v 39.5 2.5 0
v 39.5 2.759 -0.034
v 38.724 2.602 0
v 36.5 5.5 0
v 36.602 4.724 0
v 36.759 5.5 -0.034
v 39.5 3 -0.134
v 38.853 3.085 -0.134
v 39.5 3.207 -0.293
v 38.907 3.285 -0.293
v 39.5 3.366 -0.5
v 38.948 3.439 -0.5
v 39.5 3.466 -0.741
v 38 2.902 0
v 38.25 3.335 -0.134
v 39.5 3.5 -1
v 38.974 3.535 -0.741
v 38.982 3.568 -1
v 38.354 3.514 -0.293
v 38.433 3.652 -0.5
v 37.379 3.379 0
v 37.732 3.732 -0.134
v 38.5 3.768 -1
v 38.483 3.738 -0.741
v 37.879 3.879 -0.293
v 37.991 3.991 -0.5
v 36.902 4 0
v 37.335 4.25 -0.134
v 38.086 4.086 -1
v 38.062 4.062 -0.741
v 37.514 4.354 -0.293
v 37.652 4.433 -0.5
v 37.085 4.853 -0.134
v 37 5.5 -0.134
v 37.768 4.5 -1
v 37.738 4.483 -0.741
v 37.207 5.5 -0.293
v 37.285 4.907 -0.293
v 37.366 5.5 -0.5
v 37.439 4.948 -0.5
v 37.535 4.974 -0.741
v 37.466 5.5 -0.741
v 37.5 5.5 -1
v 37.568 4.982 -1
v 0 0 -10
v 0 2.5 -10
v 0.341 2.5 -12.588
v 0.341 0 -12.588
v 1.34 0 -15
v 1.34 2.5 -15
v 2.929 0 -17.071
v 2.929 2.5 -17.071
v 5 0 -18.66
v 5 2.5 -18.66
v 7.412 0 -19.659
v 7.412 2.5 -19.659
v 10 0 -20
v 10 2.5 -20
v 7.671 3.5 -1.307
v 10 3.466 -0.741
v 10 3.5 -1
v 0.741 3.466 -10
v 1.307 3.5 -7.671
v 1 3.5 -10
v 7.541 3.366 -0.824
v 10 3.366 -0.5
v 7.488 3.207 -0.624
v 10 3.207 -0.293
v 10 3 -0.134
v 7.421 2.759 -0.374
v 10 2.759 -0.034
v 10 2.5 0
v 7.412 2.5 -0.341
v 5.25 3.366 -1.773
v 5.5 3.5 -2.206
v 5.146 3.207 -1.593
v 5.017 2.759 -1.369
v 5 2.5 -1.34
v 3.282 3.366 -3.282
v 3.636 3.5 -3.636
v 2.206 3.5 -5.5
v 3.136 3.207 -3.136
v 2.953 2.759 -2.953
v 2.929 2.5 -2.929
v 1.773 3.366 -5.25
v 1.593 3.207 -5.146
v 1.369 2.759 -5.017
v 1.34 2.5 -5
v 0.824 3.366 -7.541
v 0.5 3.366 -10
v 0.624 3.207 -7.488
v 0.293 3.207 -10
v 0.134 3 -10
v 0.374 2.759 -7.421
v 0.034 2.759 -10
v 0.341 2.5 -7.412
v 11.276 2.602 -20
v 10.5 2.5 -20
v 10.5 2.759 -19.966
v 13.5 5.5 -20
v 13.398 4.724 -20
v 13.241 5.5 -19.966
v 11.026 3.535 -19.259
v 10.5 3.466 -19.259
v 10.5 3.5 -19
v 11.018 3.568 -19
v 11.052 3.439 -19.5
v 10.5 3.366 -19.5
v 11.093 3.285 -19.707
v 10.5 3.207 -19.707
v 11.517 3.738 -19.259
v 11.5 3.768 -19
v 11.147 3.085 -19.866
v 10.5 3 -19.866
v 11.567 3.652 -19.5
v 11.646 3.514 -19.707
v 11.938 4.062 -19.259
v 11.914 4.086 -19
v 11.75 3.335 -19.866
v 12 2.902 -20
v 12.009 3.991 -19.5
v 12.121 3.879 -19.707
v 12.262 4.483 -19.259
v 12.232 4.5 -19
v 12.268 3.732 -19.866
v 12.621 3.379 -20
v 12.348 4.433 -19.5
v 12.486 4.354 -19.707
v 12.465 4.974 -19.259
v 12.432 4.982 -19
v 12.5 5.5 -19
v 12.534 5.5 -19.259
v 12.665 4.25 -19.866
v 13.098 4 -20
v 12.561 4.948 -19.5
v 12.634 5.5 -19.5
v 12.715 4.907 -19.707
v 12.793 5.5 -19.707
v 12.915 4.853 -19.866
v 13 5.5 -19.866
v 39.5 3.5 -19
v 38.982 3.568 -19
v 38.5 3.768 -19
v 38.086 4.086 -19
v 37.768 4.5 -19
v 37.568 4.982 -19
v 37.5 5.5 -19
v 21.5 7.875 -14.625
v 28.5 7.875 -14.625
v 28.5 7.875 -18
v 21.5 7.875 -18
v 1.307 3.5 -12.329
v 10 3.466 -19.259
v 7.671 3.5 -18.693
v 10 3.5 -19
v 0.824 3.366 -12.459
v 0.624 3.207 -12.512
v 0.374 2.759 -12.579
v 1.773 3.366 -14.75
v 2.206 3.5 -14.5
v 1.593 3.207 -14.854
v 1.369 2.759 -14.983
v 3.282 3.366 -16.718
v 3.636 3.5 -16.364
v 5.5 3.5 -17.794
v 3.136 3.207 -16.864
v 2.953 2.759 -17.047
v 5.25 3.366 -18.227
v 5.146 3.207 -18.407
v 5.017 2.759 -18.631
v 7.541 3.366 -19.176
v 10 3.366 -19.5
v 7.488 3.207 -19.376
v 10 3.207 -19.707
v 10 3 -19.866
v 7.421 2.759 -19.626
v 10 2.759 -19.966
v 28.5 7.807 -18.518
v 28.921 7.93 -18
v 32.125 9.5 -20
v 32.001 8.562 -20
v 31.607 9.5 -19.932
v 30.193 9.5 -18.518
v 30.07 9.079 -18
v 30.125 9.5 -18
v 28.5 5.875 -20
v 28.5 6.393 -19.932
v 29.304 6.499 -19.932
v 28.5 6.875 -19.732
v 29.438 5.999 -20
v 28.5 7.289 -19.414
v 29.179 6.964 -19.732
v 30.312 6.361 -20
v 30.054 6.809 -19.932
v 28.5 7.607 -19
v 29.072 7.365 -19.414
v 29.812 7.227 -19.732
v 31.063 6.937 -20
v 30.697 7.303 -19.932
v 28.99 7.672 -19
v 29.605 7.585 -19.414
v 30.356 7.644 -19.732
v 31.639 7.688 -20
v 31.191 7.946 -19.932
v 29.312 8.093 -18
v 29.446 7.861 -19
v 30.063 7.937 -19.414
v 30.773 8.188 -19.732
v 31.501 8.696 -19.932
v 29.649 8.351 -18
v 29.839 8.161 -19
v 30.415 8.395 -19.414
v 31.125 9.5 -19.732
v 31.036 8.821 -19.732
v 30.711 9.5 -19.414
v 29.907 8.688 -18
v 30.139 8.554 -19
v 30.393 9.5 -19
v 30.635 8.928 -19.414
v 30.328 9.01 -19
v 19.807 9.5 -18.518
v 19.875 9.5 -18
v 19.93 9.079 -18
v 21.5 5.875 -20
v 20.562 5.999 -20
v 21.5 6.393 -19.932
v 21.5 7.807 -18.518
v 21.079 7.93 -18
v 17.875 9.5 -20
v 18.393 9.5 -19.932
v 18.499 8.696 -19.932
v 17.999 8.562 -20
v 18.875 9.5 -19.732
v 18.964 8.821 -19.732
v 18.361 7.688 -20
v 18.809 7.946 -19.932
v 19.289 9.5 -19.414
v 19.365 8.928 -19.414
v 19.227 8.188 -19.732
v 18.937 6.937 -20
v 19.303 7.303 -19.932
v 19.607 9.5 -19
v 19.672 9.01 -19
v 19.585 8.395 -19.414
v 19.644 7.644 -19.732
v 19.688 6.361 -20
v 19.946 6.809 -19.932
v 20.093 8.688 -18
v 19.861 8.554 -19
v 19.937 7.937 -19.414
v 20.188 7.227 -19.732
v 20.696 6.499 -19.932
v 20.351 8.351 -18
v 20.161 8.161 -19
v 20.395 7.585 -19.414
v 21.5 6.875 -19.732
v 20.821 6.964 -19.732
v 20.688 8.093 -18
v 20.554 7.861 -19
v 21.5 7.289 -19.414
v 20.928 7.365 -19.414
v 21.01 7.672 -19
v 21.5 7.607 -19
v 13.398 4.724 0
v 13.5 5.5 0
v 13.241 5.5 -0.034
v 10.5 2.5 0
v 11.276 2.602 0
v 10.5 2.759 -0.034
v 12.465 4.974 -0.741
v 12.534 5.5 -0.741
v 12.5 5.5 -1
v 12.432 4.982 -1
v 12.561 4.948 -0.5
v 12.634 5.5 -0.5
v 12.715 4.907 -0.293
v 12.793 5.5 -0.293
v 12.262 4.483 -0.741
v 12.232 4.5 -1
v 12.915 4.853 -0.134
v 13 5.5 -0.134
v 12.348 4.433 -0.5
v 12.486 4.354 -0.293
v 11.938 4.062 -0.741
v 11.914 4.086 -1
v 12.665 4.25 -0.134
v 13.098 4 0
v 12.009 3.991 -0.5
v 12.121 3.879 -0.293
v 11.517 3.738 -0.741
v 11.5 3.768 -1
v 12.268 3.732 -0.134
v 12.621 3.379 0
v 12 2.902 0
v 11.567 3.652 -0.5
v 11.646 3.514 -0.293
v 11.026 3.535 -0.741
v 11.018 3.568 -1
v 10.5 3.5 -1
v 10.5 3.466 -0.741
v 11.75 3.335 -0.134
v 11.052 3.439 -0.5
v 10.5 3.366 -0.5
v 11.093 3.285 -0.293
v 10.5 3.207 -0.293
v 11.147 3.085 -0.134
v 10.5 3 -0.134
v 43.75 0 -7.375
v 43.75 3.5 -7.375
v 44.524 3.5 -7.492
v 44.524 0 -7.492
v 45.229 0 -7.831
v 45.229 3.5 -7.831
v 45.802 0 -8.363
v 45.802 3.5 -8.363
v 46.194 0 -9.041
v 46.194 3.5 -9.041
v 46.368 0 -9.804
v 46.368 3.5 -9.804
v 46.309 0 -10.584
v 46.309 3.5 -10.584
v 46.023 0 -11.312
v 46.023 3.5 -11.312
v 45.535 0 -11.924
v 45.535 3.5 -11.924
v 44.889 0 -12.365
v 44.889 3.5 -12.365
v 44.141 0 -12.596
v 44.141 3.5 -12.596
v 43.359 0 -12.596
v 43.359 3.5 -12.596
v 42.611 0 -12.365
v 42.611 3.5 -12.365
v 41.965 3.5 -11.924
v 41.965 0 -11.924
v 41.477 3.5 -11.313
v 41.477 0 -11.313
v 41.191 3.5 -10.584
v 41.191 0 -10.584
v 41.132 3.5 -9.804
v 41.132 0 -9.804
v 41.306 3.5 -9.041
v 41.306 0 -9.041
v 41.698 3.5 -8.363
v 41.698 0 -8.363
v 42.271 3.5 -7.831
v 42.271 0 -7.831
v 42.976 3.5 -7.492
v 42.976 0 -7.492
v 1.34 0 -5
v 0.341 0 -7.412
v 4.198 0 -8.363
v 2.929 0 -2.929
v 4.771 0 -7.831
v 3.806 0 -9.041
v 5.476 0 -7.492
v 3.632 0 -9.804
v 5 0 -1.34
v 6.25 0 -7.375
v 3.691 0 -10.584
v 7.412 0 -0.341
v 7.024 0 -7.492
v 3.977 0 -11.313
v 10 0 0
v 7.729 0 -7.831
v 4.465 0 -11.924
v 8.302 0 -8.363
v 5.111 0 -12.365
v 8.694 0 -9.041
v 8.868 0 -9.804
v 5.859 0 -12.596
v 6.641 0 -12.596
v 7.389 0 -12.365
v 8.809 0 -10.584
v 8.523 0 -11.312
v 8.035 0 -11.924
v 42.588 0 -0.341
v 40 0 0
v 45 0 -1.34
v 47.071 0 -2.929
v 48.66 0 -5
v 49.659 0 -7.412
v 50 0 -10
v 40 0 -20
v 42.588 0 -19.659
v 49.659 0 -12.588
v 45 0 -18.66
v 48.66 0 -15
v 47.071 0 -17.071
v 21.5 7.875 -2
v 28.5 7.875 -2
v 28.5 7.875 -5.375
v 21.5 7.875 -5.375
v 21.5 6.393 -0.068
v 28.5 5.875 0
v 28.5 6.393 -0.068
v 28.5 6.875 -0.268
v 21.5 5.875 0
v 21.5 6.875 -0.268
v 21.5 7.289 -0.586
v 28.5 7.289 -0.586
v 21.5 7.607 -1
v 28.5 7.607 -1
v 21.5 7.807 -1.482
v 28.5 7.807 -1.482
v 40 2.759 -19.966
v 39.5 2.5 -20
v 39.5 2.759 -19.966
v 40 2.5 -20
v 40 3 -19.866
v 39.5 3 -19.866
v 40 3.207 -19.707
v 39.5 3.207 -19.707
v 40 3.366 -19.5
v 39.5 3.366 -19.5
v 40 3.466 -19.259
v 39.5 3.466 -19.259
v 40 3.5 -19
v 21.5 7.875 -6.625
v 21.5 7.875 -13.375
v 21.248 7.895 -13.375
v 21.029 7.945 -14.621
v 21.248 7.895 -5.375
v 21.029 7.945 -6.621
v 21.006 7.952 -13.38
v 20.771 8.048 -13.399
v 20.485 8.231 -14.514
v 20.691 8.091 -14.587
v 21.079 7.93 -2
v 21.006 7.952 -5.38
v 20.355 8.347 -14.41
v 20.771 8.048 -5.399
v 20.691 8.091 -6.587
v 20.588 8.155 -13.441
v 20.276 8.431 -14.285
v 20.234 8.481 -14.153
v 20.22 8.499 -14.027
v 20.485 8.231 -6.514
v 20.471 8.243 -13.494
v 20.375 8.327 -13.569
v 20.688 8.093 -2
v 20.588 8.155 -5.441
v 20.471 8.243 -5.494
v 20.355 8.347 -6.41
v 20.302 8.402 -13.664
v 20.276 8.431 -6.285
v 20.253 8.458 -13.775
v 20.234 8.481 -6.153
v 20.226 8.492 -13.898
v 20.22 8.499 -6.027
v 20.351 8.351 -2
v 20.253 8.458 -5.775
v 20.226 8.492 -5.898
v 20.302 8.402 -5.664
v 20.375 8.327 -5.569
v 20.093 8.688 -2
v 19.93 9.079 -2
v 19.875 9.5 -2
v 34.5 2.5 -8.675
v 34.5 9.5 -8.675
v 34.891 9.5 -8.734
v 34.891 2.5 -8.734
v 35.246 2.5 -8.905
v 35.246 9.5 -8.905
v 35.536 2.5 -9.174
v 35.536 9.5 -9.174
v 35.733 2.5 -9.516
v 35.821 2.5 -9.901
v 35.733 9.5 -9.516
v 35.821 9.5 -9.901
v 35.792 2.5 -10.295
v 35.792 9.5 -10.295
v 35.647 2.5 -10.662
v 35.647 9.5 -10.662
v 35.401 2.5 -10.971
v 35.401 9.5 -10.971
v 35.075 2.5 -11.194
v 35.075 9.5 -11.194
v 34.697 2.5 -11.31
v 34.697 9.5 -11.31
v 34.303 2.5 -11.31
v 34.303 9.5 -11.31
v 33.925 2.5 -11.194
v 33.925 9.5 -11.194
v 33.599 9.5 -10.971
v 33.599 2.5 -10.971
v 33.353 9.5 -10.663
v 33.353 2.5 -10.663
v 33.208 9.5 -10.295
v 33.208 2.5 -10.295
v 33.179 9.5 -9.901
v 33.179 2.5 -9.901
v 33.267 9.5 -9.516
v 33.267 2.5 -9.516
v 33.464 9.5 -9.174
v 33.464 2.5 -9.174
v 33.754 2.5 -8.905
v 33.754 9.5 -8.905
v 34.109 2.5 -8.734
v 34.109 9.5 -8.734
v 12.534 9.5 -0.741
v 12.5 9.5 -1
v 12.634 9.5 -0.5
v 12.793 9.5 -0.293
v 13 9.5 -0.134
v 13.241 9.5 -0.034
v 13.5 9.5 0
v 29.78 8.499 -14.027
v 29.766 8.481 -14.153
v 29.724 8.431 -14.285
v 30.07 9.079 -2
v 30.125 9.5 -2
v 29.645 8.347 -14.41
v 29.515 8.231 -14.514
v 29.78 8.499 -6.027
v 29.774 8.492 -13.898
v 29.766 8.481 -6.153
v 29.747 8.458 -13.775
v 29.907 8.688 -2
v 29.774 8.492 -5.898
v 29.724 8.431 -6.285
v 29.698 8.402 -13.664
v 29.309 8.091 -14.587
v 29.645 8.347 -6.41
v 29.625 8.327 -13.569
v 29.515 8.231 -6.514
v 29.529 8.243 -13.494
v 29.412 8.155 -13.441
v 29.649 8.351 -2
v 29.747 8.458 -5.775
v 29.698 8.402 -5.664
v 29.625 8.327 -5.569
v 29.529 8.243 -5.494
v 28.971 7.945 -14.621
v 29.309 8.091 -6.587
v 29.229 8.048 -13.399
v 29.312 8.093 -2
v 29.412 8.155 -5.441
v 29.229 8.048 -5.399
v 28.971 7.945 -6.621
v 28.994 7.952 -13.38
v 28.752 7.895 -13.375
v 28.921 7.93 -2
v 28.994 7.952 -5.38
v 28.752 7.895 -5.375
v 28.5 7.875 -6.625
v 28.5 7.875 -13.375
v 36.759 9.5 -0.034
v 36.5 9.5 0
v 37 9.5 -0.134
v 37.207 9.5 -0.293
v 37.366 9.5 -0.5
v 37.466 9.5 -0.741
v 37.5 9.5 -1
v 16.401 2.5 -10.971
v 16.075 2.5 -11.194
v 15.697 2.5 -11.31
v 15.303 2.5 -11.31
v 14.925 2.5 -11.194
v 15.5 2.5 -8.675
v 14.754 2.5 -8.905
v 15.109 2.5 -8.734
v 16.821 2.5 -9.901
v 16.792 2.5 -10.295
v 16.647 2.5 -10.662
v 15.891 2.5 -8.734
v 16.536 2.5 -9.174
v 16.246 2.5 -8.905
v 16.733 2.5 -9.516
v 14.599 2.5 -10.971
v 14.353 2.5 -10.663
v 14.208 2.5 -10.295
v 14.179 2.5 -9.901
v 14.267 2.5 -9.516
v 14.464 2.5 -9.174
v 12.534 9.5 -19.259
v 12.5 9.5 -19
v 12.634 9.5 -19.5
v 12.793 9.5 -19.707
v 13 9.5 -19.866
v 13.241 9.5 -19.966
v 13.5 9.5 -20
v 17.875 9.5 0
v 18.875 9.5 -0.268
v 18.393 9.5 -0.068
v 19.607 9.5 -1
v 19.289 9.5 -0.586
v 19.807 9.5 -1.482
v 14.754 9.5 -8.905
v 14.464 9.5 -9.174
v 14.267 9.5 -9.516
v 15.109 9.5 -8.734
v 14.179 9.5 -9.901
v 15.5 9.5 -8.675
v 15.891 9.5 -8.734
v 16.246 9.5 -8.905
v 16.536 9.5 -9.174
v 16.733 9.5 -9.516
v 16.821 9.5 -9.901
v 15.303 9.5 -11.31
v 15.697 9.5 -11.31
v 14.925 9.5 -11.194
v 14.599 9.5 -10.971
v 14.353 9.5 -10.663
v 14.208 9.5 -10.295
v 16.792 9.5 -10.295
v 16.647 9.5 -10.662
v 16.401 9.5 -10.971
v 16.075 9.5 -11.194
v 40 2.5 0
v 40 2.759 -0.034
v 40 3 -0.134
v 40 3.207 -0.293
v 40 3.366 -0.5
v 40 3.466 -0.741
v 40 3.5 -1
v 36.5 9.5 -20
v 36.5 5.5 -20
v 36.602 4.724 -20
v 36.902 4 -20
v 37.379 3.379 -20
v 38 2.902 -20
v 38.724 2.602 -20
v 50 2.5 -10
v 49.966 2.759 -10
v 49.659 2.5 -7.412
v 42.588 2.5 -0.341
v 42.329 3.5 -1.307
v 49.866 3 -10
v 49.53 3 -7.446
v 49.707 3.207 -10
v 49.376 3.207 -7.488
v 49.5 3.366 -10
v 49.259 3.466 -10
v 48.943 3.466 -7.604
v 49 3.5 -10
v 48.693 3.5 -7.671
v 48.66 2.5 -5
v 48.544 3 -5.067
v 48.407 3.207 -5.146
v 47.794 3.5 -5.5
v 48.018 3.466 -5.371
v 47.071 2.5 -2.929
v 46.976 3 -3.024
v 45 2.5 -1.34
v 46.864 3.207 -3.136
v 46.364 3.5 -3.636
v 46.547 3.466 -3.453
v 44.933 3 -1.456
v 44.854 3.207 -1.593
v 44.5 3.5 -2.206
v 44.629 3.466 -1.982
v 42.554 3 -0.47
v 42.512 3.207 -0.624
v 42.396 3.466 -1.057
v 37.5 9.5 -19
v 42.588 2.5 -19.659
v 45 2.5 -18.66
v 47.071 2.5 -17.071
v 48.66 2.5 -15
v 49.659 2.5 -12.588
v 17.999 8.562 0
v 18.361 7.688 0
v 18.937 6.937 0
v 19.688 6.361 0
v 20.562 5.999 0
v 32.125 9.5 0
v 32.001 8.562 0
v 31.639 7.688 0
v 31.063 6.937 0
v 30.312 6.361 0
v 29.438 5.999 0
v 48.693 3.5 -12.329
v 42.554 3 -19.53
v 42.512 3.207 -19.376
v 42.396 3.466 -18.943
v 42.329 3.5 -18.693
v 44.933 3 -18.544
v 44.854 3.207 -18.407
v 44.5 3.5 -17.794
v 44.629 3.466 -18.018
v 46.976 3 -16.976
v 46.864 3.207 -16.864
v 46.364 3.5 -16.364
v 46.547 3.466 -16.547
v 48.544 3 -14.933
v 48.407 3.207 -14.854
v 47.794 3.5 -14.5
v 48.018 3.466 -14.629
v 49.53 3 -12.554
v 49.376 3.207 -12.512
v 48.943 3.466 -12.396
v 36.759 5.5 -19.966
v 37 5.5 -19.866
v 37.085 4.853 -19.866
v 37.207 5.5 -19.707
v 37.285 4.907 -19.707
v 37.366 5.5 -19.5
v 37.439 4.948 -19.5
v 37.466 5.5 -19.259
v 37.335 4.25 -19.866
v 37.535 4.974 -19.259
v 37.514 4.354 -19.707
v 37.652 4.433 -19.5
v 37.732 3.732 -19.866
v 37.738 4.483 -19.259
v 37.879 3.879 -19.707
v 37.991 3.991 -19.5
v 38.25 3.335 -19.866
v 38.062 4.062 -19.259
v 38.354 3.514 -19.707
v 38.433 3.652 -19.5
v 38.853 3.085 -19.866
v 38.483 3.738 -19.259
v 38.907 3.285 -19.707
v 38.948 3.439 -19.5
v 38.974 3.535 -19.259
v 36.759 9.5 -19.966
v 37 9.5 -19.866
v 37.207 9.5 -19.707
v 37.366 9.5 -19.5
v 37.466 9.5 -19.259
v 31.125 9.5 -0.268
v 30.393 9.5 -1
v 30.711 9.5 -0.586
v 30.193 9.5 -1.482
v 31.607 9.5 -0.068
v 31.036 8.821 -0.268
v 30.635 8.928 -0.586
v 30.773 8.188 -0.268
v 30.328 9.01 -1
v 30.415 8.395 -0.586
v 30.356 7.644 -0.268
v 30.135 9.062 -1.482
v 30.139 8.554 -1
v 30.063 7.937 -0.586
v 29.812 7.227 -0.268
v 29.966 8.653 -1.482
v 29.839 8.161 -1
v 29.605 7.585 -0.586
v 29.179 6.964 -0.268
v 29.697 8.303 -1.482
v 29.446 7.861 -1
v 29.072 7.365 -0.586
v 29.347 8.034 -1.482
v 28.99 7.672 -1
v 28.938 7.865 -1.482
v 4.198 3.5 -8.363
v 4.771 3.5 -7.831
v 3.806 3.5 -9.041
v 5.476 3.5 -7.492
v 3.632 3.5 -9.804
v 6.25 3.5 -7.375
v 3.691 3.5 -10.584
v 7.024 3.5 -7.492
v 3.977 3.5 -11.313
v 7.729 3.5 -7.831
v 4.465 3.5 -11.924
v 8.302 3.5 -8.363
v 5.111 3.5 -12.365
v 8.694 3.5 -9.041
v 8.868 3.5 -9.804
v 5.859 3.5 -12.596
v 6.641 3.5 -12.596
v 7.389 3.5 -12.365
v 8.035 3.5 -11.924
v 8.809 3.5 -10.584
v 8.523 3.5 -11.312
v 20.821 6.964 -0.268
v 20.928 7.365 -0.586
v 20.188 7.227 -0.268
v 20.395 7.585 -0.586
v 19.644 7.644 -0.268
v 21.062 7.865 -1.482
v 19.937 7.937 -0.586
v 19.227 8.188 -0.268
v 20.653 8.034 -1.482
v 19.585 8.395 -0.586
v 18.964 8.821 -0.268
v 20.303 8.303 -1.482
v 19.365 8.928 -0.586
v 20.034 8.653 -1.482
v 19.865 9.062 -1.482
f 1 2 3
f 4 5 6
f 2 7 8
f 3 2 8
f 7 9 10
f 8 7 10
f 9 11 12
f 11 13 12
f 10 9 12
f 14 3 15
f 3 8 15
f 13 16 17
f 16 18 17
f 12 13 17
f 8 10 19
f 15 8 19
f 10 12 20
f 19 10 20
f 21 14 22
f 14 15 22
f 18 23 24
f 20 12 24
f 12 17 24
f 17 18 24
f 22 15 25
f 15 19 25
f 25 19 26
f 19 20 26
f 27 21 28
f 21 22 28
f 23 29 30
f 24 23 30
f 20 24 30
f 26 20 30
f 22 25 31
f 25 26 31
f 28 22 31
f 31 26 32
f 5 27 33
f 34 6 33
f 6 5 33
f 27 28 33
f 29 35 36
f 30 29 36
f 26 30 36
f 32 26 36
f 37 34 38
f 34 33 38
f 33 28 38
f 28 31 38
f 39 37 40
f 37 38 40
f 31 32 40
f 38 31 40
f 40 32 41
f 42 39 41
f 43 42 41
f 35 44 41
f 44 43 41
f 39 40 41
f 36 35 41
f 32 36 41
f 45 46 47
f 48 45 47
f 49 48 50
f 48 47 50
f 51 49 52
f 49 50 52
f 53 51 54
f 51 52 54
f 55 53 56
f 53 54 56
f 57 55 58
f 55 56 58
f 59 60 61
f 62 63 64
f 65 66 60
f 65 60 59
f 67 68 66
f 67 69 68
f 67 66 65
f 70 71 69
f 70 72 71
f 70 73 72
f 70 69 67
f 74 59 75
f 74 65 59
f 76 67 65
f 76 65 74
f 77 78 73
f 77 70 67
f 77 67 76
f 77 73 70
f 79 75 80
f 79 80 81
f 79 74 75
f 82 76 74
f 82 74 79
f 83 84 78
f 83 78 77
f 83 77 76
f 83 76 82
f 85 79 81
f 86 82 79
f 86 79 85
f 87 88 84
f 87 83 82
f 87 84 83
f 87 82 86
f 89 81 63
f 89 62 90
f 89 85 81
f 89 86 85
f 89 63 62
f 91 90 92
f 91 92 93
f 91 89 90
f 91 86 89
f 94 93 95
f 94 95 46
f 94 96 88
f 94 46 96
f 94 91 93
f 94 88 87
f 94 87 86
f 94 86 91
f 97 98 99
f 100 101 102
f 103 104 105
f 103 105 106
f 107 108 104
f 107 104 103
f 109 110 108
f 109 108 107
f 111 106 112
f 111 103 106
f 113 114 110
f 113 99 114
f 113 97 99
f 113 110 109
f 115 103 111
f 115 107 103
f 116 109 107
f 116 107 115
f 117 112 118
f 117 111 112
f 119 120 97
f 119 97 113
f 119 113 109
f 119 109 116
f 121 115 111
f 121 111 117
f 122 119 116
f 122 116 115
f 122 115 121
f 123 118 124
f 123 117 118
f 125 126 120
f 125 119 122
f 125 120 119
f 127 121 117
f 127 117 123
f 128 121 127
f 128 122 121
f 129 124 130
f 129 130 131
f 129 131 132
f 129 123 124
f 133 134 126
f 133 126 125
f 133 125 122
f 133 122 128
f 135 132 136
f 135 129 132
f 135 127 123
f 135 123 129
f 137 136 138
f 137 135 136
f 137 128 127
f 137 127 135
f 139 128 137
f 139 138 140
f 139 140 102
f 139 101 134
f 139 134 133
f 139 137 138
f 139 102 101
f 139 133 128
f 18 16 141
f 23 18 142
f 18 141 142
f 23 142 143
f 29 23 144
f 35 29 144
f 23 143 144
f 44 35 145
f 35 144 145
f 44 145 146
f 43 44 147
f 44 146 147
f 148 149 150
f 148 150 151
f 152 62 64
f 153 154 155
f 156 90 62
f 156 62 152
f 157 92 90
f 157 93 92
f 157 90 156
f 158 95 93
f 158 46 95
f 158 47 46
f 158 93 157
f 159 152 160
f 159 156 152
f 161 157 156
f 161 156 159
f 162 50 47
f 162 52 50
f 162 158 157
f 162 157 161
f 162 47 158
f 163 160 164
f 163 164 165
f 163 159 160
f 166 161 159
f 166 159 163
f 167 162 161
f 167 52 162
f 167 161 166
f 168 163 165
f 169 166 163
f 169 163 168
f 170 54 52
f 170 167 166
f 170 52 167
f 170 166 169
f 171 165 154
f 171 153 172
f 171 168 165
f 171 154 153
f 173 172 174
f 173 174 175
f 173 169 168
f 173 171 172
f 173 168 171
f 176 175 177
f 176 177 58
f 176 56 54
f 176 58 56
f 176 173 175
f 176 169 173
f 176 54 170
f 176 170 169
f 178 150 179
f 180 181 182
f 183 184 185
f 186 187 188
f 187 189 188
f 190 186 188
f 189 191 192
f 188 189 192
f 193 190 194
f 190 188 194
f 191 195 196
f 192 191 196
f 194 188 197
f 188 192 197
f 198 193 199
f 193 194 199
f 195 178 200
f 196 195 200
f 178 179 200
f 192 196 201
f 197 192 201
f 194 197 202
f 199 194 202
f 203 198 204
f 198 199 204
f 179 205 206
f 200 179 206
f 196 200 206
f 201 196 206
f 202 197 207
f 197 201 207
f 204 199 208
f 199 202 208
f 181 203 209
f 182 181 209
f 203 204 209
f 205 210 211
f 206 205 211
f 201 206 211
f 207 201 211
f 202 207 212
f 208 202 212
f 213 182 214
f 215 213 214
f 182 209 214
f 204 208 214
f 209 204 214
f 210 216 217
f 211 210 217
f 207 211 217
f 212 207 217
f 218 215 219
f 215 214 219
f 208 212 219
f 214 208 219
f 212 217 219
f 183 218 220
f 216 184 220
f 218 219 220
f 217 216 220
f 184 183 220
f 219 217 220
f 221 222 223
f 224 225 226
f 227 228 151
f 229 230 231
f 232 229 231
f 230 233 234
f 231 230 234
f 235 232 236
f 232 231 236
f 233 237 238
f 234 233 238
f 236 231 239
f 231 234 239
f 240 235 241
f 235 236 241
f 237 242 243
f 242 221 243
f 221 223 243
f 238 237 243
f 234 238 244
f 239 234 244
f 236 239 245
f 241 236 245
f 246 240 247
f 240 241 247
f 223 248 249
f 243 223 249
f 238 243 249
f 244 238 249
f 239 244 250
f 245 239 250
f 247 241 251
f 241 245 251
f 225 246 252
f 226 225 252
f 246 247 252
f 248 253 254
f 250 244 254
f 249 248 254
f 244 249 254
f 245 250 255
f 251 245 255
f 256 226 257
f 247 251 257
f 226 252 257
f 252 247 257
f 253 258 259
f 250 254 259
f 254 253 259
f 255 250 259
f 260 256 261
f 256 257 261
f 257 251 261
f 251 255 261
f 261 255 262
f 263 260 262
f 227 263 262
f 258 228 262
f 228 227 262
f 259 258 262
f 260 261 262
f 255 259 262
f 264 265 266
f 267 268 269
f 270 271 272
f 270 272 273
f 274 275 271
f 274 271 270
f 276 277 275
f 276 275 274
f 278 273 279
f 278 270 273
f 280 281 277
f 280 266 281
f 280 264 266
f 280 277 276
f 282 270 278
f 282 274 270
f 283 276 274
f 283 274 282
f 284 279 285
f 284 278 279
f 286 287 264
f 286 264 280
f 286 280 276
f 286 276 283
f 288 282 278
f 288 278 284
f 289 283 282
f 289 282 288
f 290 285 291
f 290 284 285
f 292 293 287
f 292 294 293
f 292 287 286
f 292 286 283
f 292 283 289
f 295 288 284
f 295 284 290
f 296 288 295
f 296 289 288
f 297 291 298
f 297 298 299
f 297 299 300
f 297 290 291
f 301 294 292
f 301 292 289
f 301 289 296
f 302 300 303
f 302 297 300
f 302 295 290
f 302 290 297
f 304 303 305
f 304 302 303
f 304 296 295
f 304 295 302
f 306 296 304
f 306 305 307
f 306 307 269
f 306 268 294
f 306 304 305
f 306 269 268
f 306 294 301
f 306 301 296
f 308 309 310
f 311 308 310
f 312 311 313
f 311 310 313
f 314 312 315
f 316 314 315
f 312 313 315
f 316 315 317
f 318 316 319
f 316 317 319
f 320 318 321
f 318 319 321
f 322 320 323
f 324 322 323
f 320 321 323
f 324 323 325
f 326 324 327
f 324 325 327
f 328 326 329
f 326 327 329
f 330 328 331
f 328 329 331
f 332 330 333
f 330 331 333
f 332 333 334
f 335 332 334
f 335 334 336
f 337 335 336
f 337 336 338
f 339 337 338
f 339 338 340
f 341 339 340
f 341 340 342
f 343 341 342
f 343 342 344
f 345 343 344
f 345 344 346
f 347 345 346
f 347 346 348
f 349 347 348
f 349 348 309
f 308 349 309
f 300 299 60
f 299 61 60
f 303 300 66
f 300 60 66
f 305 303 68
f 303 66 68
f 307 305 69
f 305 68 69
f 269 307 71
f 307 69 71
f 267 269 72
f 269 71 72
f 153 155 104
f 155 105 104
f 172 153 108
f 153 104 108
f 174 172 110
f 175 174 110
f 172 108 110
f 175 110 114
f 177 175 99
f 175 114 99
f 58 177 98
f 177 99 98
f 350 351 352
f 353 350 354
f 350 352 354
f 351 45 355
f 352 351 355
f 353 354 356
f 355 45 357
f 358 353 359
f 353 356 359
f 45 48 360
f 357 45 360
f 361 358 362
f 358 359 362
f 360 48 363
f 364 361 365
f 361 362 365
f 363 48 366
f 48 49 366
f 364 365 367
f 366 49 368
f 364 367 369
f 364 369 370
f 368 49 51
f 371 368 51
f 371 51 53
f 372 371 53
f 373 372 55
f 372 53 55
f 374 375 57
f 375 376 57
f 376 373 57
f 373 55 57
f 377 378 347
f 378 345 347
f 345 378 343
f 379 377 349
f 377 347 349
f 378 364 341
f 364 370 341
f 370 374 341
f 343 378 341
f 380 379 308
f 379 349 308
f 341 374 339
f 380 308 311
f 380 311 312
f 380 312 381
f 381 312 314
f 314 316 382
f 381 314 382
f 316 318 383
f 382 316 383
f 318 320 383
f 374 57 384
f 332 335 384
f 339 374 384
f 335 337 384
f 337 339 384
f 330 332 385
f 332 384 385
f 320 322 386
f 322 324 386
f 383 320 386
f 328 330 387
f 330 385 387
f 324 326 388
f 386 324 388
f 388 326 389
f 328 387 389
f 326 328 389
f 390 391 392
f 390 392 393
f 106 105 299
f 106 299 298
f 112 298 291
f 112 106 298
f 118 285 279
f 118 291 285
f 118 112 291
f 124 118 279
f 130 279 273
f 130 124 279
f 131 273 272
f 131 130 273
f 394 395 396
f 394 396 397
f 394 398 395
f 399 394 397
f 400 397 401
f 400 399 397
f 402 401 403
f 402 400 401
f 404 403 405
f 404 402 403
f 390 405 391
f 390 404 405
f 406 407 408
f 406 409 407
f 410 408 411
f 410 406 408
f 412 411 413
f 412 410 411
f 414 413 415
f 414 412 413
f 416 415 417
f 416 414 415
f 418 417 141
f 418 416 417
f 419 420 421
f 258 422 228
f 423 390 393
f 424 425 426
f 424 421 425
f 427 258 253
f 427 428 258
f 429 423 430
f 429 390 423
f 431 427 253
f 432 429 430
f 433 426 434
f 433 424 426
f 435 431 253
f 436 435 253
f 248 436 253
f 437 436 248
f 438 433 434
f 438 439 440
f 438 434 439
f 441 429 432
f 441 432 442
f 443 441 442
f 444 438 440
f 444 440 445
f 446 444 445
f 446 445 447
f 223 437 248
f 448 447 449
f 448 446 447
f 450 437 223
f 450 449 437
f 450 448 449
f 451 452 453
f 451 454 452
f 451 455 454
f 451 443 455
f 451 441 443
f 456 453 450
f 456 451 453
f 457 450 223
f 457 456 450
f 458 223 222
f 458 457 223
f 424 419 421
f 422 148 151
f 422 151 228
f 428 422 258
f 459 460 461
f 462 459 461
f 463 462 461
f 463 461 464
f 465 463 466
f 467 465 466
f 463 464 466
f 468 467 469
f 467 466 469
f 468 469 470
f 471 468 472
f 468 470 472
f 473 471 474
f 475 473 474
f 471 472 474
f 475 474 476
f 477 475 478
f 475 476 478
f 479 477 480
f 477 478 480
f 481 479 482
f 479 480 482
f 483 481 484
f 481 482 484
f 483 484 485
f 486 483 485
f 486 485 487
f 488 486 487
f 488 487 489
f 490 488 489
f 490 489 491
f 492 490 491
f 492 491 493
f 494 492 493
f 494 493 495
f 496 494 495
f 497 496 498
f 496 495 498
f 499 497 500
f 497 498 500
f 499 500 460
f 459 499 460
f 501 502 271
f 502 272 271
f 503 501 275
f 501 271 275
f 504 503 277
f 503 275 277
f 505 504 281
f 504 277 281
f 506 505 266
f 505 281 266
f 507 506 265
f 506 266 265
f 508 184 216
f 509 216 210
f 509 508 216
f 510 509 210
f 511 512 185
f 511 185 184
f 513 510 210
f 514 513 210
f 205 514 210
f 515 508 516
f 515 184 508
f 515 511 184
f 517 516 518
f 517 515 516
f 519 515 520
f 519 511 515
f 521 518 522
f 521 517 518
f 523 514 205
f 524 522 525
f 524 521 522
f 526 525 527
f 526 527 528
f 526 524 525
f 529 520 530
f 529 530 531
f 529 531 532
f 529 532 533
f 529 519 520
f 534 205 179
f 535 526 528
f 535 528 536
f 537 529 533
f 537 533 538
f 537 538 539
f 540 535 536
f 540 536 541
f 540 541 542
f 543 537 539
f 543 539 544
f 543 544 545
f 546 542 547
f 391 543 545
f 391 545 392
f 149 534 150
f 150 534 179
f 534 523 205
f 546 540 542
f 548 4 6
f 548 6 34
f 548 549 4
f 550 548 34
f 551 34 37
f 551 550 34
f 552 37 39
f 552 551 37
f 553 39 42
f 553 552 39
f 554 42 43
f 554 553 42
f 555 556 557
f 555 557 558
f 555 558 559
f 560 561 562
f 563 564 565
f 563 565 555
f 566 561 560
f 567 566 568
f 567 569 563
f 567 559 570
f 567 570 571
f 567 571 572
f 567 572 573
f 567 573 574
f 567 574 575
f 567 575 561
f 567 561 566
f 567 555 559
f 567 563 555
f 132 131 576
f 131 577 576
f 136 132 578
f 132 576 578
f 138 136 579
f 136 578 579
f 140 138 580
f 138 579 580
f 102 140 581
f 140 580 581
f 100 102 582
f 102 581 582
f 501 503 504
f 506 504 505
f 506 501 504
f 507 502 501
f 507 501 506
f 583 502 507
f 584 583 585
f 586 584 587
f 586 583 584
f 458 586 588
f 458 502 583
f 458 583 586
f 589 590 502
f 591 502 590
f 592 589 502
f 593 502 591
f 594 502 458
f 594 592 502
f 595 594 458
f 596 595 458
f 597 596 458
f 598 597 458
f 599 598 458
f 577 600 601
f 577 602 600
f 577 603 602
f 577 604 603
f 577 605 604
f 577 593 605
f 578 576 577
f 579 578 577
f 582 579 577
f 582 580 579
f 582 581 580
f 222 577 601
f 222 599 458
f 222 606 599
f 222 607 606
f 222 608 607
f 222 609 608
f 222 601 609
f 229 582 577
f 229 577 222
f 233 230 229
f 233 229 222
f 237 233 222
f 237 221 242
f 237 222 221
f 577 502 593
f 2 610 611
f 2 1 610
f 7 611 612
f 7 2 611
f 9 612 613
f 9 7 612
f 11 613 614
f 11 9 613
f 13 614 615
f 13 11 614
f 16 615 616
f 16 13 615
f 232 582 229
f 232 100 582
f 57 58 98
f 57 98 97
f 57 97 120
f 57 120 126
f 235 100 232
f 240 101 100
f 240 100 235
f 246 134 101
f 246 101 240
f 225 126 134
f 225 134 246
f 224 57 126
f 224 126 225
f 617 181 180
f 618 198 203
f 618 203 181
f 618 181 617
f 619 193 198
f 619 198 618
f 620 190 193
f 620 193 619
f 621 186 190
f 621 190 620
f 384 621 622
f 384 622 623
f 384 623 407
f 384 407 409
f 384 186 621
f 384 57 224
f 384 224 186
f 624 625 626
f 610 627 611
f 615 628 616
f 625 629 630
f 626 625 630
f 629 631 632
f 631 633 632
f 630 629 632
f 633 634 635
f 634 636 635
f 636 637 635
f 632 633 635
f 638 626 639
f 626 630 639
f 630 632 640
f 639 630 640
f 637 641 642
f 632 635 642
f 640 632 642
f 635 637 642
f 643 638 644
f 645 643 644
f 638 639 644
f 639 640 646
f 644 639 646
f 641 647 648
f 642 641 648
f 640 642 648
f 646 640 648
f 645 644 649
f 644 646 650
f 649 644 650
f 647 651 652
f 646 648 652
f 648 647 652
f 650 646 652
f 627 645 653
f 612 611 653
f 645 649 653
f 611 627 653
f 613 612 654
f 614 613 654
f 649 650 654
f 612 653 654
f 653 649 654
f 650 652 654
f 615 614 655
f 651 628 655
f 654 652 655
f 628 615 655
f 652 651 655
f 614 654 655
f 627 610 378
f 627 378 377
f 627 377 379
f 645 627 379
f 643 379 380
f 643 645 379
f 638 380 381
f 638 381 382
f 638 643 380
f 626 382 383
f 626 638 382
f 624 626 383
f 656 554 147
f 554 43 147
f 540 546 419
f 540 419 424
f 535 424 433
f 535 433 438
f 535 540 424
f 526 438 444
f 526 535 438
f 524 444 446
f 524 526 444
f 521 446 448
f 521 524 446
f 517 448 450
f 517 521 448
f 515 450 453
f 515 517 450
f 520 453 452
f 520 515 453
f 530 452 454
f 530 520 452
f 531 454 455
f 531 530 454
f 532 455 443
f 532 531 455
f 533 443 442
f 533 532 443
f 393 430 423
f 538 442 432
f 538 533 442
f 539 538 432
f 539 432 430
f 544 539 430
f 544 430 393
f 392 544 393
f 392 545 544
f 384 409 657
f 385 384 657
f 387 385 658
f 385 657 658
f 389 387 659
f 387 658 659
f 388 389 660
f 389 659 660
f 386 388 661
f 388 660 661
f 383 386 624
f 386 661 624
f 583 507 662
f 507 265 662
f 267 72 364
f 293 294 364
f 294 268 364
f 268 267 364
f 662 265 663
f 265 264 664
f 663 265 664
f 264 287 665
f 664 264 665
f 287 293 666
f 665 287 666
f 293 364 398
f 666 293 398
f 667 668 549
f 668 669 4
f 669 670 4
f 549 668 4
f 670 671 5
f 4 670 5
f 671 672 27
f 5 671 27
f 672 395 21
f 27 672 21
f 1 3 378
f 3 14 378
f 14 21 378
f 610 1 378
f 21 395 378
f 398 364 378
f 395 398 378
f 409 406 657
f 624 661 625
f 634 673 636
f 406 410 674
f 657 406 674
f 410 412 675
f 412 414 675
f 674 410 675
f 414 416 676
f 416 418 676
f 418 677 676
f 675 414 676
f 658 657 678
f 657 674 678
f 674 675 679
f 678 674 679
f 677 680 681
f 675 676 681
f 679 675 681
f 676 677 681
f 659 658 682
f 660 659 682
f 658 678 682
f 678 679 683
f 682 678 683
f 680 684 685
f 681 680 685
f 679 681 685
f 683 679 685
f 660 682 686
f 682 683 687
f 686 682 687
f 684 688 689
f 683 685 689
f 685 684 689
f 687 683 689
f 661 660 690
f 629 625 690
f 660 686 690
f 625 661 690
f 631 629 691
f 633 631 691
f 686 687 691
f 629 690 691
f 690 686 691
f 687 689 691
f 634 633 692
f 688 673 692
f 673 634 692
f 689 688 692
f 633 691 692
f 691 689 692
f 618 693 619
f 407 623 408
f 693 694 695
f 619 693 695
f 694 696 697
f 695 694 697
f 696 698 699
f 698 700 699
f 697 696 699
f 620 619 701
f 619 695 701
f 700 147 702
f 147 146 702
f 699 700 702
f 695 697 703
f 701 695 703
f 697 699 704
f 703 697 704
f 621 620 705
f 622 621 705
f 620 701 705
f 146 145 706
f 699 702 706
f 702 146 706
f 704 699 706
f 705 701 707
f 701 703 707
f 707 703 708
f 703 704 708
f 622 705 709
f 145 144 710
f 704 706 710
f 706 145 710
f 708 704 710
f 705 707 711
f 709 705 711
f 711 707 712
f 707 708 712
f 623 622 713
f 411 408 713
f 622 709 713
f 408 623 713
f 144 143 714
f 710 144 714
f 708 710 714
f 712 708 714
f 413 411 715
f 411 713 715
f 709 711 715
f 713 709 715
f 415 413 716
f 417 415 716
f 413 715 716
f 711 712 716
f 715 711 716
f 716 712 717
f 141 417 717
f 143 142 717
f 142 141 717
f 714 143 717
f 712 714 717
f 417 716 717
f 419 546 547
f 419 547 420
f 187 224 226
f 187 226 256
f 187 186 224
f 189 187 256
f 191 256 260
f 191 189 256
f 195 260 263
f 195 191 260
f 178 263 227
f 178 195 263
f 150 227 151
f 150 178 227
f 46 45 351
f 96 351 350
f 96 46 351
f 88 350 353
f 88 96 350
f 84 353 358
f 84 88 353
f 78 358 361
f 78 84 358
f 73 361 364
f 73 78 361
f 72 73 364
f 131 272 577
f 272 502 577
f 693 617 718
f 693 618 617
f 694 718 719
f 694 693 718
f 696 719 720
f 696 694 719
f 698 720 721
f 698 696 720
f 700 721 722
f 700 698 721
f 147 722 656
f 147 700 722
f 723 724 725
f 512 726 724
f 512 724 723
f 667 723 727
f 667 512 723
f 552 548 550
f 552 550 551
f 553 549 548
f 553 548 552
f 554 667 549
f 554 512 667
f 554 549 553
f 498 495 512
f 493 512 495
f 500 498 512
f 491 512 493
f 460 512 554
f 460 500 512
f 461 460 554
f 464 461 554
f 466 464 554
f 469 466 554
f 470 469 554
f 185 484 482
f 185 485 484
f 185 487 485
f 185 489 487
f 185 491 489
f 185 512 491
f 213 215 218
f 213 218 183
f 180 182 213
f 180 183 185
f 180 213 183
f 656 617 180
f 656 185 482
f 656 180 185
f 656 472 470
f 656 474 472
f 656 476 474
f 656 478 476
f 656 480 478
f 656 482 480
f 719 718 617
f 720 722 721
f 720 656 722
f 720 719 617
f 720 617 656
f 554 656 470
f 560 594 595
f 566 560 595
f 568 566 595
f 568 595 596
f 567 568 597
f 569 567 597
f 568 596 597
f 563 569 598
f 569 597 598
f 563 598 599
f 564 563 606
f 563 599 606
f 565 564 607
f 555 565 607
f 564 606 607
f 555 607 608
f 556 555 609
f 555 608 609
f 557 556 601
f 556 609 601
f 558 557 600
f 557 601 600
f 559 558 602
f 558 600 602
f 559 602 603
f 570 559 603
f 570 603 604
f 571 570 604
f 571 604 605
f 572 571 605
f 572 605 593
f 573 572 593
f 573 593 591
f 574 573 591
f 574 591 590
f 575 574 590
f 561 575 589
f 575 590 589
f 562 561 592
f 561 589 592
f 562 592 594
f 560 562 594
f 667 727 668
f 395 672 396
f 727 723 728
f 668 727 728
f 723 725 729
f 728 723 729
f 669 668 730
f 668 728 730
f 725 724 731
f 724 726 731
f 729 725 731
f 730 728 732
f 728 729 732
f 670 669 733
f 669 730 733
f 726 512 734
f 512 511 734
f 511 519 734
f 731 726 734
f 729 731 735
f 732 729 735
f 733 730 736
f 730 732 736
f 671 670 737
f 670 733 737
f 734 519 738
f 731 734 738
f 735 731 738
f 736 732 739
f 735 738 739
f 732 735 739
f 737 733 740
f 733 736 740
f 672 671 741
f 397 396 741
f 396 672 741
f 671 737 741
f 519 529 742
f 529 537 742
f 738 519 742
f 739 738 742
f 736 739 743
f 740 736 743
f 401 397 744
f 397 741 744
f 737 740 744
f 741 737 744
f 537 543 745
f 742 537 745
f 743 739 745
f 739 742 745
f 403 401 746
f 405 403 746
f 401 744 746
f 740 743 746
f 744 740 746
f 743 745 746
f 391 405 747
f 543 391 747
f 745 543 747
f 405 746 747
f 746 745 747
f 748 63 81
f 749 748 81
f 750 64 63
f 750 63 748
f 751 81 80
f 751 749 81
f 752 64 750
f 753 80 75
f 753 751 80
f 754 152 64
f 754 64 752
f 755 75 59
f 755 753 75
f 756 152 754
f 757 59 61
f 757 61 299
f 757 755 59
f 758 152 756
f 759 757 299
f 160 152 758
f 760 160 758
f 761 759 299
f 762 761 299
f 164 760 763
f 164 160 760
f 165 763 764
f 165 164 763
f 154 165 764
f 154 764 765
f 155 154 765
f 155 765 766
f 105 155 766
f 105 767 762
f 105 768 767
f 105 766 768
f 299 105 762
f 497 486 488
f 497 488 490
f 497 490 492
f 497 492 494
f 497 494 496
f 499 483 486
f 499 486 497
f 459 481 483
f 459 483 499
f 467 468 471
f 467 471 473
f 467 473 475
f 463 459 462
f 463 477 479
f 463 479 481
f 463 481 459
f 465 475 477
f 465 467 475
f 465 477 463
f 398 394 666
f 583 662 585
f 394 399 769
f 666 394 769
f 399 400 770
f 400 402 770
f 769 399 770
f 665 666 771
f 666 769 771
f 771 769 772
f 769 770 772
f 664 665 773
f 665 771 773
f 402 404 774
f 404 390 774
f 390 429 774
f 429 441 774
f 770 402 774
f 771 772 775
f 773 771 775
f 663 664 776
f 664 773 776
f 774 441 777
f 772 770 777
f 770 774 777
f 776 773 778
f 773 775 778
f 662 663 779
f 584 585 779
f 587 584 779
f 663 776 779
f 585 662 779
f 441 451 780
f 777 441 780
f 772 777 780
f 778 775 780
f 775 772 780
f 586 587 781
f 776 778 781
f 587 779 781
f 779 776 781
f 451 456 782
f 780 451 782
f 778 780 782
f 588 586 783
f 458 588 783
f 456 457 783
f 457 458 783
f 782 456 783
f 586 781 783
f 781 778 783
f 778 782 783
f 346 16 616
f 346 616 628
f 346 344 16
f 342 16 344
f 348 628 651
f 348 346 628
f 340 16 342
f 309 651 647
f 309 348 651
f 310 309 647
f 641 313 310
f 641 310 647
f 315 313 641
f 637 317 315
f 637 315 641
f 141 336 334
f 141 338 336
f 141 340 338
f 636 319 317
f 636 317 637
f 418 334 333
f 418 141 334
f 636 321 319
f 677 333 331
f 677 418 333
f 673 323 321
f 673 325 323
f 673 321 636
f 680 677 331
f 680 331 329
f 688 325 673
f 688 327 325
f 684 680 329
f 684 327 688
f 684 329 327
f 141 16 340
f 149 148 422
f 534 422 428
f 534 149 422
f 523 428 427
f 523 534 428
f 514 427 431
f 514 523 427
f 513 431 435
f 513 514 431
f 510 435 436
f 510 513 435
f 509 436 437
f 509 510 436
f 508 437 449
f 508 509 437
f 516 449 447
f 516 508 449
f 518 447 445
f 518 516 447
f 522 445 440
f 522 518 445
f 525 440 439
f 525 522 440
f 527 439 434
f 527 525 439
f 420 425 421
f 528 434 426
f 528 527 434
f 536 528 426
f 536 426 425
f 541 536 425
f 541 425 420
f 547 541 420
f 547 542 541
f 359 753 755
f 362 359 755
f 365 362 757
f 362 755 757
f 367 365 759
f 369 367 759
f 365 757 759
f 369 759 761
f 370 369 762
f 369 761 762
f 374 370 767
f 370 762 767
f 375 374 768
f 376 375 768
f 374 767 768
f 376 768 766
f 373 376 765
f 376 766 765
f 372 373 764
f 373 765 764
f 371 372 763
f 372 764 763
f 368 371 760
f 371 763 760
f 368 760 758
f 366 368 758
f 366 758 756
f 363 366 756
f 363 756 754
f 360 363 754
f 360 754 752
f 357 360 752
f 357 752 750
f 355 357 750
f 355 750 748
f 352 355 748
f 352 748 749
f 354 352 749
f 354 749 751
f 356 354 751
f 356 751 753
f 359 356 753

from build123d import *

# Parameters (mm, degrees)
SKETCH1_W           = 50
SKETCH1_H           = 20
BOSS_EXTRUDE1_DEPTH = 3.5
SKETCH2_W           = 25
SKETCH2_H           = 20
BOSS_EXTRUDE2_DEPTH = 6
SKETCH3_R           = 2.625
CUT_EXTRUDE1_DEPTH  = 6
CUT_EXTRUDE2_DEPTH  = 50
SKETCH5_R           = 1.325
CUT_EXTRUDE3_DEPTH  = 7
FILLET1_R           = 10
FILLET2_R           = 2
SKETCH6_R           = 0.625
BOSS_EXTRUDE3_DEPTH = 25
FILLET3_R           = 2
FILLET4_R           = 1


with BuildPart() as part:
    # Sketch1 → Boss-Extrude1 (new body)
    with BuildSketch(Plane(origin=(0, 0, 0), x_dir=(1, 0, 0), z_dir=(0, 1, 0))):
        with Locations((25, 10)):
            Rectangle(SKETCH1_W, SKETCH1_H)
    extrude(amount=BOSS_EXTRUDE1_DEPTH)

    # Sketch2 → Boss-Extrude2 (add)
    with BuildSketch(Plane(origin=(0, 3.5, 0), x_dir=(1, 0, 0), z_dir=(0, 1, 0))):
        with Locations((25, 10)):
            Rectangle(SKETCH2_W, SKETCH2_H)
    extrude(amount=BOSS_EXTRUDE2_DEPTH)

    # Sketch3 → Cut-Extrude1 (cut)
    with BuildSketch(Plane(origin=(0, 3.5, 0), x_dir=(1, 0, 0), z_dir=(0, 1, 0))):
        with Locations(Location((6.25, 10, 0), (0, 0, 270))):
            Circle(SKETCH3_R)
        with Locations(Location((43.75, 10, 0), (0, 0, 270))):
            Circle(SKETCH3_R)
    extrude(amount=-CUT_EXTRUDE1_DEPTH, mode=Mode.SUBTRACT)

    # Sketch4 → Cut-Extrude2 (cut)
    with BuildSketch(Plane.XY):
        with BuildLine():
            Line((21.5, 11.125), (28.5, 11.125))
            ThreePointArc((28.5, 11.125), (30.125, 9.5), (28.5, 7.875))
            Line((28.5, 7.875), (21.5, 7.875))
            ThreePointArc((21.5, 7.875), (19.875, 9.5), (21.5, 11.125))
        make_face()
    extrude(amount=-CUT_EXTRUDE2_DEPTH, mode=Mode.SUBTRACT)

    # Sketch5 → Cut-Extrude3 (cut)
    with BuildSketch(Plane(origin=(0, 9.5, 0), x_dir=(1, 0, 0), z_dir=(0, 1, 0))):
        with Locations(Location((15.5, 10, 0), (0, 0, 270))):
            Circle(SKETCH5_R)
        with Locations(Location((34.5, 10, 0), (0, 0, 270))):
            Circle(SKETCH5_R)
    extrude(amount=-CUT_EXTRUDE3_DEPTH, mode=Mode.SUBTRACT)

    # Fillet1
    fillet1_edges = [part.edges().sort_by_distance(p)[0] for p in [
        (0, 1.75, -20),
        (0, 1.75, 0),
        (50, 1.75, -20),
        (50, 1.75, 0),
    ]]
    fillet(fillet1_edges, radius=FILLET1_R - 0.0001)  # a hair under: the kernel refuses the full size

    # Fillet2
    fillet2_edges = [part.edges().sort_by_distance(p)[0] for p in [
        (12.5, 3.5, -10),
        (37.5, 3.5, -10),
    ]]
    fillet(fillet2_edges, radius=FILLET2_R)

    # Sketch6 → Boss-Extrude3 (add)
    with BuildSketch(Plane(origin=(37.5, 0, 0), x_dir=(0, 0, -1), z_dir=(1, 0, 0))):
        with Locations((6, 7.875)):
            Circle(SKETCH6_R)
        with Locations((14, 7.875)):
            Circle(SKETCH6_R)
    extrude(amount=-BOSS_EXTRUDE3_DEPTH)

    # Fillet3
    fillet3_edges = [part.edges().sort_by_distance(p)[0] for p in [
        (25, 7.875, -20),
        (20.350951481, 8.350951481, -20),
        (29.649048519, 8.350951481, -20),
        (20.350951481, 8.350951481, 0),
        (25, 7.875, 0),
        (29.649048519, 8.350951481, 0),
    ]]
    fillet(fillet3_edges, radius=FILLET3_R)

    # Fillet4
    fillet4_edges = [part.edges().sort_by_distance(p)[0] for p in [
        (12.5, 7.5, -20),
        (12.5, 7.5, 0),
        (37.5, 7.5, 0),
        (37.5, 7.5, -20),
        (39.75005, 3.5, -20),
        (10.24995, 3.5, 0),
        (2.928902899, 3.5, -2.928902899),
        (2.928902899, 3.5, -17.071097101),
        (47.071097101, 3.5, -2.928902899),
        (47.071097101, 3.5, -17.071097101),
        (39.75005, 3.5, 0),
        (10.24995, 3.5, -20),
        (38.085786438, 4.085786438, -20),
        (38.085786438, 4.085786438, 0),
        (11.914213562, 4.085786438, 0),
        (11.914213562, 4.085786438, -20),
    ]]
    fillet(fillet4_edges, radius=FILLET4_R)


solid = part.part
